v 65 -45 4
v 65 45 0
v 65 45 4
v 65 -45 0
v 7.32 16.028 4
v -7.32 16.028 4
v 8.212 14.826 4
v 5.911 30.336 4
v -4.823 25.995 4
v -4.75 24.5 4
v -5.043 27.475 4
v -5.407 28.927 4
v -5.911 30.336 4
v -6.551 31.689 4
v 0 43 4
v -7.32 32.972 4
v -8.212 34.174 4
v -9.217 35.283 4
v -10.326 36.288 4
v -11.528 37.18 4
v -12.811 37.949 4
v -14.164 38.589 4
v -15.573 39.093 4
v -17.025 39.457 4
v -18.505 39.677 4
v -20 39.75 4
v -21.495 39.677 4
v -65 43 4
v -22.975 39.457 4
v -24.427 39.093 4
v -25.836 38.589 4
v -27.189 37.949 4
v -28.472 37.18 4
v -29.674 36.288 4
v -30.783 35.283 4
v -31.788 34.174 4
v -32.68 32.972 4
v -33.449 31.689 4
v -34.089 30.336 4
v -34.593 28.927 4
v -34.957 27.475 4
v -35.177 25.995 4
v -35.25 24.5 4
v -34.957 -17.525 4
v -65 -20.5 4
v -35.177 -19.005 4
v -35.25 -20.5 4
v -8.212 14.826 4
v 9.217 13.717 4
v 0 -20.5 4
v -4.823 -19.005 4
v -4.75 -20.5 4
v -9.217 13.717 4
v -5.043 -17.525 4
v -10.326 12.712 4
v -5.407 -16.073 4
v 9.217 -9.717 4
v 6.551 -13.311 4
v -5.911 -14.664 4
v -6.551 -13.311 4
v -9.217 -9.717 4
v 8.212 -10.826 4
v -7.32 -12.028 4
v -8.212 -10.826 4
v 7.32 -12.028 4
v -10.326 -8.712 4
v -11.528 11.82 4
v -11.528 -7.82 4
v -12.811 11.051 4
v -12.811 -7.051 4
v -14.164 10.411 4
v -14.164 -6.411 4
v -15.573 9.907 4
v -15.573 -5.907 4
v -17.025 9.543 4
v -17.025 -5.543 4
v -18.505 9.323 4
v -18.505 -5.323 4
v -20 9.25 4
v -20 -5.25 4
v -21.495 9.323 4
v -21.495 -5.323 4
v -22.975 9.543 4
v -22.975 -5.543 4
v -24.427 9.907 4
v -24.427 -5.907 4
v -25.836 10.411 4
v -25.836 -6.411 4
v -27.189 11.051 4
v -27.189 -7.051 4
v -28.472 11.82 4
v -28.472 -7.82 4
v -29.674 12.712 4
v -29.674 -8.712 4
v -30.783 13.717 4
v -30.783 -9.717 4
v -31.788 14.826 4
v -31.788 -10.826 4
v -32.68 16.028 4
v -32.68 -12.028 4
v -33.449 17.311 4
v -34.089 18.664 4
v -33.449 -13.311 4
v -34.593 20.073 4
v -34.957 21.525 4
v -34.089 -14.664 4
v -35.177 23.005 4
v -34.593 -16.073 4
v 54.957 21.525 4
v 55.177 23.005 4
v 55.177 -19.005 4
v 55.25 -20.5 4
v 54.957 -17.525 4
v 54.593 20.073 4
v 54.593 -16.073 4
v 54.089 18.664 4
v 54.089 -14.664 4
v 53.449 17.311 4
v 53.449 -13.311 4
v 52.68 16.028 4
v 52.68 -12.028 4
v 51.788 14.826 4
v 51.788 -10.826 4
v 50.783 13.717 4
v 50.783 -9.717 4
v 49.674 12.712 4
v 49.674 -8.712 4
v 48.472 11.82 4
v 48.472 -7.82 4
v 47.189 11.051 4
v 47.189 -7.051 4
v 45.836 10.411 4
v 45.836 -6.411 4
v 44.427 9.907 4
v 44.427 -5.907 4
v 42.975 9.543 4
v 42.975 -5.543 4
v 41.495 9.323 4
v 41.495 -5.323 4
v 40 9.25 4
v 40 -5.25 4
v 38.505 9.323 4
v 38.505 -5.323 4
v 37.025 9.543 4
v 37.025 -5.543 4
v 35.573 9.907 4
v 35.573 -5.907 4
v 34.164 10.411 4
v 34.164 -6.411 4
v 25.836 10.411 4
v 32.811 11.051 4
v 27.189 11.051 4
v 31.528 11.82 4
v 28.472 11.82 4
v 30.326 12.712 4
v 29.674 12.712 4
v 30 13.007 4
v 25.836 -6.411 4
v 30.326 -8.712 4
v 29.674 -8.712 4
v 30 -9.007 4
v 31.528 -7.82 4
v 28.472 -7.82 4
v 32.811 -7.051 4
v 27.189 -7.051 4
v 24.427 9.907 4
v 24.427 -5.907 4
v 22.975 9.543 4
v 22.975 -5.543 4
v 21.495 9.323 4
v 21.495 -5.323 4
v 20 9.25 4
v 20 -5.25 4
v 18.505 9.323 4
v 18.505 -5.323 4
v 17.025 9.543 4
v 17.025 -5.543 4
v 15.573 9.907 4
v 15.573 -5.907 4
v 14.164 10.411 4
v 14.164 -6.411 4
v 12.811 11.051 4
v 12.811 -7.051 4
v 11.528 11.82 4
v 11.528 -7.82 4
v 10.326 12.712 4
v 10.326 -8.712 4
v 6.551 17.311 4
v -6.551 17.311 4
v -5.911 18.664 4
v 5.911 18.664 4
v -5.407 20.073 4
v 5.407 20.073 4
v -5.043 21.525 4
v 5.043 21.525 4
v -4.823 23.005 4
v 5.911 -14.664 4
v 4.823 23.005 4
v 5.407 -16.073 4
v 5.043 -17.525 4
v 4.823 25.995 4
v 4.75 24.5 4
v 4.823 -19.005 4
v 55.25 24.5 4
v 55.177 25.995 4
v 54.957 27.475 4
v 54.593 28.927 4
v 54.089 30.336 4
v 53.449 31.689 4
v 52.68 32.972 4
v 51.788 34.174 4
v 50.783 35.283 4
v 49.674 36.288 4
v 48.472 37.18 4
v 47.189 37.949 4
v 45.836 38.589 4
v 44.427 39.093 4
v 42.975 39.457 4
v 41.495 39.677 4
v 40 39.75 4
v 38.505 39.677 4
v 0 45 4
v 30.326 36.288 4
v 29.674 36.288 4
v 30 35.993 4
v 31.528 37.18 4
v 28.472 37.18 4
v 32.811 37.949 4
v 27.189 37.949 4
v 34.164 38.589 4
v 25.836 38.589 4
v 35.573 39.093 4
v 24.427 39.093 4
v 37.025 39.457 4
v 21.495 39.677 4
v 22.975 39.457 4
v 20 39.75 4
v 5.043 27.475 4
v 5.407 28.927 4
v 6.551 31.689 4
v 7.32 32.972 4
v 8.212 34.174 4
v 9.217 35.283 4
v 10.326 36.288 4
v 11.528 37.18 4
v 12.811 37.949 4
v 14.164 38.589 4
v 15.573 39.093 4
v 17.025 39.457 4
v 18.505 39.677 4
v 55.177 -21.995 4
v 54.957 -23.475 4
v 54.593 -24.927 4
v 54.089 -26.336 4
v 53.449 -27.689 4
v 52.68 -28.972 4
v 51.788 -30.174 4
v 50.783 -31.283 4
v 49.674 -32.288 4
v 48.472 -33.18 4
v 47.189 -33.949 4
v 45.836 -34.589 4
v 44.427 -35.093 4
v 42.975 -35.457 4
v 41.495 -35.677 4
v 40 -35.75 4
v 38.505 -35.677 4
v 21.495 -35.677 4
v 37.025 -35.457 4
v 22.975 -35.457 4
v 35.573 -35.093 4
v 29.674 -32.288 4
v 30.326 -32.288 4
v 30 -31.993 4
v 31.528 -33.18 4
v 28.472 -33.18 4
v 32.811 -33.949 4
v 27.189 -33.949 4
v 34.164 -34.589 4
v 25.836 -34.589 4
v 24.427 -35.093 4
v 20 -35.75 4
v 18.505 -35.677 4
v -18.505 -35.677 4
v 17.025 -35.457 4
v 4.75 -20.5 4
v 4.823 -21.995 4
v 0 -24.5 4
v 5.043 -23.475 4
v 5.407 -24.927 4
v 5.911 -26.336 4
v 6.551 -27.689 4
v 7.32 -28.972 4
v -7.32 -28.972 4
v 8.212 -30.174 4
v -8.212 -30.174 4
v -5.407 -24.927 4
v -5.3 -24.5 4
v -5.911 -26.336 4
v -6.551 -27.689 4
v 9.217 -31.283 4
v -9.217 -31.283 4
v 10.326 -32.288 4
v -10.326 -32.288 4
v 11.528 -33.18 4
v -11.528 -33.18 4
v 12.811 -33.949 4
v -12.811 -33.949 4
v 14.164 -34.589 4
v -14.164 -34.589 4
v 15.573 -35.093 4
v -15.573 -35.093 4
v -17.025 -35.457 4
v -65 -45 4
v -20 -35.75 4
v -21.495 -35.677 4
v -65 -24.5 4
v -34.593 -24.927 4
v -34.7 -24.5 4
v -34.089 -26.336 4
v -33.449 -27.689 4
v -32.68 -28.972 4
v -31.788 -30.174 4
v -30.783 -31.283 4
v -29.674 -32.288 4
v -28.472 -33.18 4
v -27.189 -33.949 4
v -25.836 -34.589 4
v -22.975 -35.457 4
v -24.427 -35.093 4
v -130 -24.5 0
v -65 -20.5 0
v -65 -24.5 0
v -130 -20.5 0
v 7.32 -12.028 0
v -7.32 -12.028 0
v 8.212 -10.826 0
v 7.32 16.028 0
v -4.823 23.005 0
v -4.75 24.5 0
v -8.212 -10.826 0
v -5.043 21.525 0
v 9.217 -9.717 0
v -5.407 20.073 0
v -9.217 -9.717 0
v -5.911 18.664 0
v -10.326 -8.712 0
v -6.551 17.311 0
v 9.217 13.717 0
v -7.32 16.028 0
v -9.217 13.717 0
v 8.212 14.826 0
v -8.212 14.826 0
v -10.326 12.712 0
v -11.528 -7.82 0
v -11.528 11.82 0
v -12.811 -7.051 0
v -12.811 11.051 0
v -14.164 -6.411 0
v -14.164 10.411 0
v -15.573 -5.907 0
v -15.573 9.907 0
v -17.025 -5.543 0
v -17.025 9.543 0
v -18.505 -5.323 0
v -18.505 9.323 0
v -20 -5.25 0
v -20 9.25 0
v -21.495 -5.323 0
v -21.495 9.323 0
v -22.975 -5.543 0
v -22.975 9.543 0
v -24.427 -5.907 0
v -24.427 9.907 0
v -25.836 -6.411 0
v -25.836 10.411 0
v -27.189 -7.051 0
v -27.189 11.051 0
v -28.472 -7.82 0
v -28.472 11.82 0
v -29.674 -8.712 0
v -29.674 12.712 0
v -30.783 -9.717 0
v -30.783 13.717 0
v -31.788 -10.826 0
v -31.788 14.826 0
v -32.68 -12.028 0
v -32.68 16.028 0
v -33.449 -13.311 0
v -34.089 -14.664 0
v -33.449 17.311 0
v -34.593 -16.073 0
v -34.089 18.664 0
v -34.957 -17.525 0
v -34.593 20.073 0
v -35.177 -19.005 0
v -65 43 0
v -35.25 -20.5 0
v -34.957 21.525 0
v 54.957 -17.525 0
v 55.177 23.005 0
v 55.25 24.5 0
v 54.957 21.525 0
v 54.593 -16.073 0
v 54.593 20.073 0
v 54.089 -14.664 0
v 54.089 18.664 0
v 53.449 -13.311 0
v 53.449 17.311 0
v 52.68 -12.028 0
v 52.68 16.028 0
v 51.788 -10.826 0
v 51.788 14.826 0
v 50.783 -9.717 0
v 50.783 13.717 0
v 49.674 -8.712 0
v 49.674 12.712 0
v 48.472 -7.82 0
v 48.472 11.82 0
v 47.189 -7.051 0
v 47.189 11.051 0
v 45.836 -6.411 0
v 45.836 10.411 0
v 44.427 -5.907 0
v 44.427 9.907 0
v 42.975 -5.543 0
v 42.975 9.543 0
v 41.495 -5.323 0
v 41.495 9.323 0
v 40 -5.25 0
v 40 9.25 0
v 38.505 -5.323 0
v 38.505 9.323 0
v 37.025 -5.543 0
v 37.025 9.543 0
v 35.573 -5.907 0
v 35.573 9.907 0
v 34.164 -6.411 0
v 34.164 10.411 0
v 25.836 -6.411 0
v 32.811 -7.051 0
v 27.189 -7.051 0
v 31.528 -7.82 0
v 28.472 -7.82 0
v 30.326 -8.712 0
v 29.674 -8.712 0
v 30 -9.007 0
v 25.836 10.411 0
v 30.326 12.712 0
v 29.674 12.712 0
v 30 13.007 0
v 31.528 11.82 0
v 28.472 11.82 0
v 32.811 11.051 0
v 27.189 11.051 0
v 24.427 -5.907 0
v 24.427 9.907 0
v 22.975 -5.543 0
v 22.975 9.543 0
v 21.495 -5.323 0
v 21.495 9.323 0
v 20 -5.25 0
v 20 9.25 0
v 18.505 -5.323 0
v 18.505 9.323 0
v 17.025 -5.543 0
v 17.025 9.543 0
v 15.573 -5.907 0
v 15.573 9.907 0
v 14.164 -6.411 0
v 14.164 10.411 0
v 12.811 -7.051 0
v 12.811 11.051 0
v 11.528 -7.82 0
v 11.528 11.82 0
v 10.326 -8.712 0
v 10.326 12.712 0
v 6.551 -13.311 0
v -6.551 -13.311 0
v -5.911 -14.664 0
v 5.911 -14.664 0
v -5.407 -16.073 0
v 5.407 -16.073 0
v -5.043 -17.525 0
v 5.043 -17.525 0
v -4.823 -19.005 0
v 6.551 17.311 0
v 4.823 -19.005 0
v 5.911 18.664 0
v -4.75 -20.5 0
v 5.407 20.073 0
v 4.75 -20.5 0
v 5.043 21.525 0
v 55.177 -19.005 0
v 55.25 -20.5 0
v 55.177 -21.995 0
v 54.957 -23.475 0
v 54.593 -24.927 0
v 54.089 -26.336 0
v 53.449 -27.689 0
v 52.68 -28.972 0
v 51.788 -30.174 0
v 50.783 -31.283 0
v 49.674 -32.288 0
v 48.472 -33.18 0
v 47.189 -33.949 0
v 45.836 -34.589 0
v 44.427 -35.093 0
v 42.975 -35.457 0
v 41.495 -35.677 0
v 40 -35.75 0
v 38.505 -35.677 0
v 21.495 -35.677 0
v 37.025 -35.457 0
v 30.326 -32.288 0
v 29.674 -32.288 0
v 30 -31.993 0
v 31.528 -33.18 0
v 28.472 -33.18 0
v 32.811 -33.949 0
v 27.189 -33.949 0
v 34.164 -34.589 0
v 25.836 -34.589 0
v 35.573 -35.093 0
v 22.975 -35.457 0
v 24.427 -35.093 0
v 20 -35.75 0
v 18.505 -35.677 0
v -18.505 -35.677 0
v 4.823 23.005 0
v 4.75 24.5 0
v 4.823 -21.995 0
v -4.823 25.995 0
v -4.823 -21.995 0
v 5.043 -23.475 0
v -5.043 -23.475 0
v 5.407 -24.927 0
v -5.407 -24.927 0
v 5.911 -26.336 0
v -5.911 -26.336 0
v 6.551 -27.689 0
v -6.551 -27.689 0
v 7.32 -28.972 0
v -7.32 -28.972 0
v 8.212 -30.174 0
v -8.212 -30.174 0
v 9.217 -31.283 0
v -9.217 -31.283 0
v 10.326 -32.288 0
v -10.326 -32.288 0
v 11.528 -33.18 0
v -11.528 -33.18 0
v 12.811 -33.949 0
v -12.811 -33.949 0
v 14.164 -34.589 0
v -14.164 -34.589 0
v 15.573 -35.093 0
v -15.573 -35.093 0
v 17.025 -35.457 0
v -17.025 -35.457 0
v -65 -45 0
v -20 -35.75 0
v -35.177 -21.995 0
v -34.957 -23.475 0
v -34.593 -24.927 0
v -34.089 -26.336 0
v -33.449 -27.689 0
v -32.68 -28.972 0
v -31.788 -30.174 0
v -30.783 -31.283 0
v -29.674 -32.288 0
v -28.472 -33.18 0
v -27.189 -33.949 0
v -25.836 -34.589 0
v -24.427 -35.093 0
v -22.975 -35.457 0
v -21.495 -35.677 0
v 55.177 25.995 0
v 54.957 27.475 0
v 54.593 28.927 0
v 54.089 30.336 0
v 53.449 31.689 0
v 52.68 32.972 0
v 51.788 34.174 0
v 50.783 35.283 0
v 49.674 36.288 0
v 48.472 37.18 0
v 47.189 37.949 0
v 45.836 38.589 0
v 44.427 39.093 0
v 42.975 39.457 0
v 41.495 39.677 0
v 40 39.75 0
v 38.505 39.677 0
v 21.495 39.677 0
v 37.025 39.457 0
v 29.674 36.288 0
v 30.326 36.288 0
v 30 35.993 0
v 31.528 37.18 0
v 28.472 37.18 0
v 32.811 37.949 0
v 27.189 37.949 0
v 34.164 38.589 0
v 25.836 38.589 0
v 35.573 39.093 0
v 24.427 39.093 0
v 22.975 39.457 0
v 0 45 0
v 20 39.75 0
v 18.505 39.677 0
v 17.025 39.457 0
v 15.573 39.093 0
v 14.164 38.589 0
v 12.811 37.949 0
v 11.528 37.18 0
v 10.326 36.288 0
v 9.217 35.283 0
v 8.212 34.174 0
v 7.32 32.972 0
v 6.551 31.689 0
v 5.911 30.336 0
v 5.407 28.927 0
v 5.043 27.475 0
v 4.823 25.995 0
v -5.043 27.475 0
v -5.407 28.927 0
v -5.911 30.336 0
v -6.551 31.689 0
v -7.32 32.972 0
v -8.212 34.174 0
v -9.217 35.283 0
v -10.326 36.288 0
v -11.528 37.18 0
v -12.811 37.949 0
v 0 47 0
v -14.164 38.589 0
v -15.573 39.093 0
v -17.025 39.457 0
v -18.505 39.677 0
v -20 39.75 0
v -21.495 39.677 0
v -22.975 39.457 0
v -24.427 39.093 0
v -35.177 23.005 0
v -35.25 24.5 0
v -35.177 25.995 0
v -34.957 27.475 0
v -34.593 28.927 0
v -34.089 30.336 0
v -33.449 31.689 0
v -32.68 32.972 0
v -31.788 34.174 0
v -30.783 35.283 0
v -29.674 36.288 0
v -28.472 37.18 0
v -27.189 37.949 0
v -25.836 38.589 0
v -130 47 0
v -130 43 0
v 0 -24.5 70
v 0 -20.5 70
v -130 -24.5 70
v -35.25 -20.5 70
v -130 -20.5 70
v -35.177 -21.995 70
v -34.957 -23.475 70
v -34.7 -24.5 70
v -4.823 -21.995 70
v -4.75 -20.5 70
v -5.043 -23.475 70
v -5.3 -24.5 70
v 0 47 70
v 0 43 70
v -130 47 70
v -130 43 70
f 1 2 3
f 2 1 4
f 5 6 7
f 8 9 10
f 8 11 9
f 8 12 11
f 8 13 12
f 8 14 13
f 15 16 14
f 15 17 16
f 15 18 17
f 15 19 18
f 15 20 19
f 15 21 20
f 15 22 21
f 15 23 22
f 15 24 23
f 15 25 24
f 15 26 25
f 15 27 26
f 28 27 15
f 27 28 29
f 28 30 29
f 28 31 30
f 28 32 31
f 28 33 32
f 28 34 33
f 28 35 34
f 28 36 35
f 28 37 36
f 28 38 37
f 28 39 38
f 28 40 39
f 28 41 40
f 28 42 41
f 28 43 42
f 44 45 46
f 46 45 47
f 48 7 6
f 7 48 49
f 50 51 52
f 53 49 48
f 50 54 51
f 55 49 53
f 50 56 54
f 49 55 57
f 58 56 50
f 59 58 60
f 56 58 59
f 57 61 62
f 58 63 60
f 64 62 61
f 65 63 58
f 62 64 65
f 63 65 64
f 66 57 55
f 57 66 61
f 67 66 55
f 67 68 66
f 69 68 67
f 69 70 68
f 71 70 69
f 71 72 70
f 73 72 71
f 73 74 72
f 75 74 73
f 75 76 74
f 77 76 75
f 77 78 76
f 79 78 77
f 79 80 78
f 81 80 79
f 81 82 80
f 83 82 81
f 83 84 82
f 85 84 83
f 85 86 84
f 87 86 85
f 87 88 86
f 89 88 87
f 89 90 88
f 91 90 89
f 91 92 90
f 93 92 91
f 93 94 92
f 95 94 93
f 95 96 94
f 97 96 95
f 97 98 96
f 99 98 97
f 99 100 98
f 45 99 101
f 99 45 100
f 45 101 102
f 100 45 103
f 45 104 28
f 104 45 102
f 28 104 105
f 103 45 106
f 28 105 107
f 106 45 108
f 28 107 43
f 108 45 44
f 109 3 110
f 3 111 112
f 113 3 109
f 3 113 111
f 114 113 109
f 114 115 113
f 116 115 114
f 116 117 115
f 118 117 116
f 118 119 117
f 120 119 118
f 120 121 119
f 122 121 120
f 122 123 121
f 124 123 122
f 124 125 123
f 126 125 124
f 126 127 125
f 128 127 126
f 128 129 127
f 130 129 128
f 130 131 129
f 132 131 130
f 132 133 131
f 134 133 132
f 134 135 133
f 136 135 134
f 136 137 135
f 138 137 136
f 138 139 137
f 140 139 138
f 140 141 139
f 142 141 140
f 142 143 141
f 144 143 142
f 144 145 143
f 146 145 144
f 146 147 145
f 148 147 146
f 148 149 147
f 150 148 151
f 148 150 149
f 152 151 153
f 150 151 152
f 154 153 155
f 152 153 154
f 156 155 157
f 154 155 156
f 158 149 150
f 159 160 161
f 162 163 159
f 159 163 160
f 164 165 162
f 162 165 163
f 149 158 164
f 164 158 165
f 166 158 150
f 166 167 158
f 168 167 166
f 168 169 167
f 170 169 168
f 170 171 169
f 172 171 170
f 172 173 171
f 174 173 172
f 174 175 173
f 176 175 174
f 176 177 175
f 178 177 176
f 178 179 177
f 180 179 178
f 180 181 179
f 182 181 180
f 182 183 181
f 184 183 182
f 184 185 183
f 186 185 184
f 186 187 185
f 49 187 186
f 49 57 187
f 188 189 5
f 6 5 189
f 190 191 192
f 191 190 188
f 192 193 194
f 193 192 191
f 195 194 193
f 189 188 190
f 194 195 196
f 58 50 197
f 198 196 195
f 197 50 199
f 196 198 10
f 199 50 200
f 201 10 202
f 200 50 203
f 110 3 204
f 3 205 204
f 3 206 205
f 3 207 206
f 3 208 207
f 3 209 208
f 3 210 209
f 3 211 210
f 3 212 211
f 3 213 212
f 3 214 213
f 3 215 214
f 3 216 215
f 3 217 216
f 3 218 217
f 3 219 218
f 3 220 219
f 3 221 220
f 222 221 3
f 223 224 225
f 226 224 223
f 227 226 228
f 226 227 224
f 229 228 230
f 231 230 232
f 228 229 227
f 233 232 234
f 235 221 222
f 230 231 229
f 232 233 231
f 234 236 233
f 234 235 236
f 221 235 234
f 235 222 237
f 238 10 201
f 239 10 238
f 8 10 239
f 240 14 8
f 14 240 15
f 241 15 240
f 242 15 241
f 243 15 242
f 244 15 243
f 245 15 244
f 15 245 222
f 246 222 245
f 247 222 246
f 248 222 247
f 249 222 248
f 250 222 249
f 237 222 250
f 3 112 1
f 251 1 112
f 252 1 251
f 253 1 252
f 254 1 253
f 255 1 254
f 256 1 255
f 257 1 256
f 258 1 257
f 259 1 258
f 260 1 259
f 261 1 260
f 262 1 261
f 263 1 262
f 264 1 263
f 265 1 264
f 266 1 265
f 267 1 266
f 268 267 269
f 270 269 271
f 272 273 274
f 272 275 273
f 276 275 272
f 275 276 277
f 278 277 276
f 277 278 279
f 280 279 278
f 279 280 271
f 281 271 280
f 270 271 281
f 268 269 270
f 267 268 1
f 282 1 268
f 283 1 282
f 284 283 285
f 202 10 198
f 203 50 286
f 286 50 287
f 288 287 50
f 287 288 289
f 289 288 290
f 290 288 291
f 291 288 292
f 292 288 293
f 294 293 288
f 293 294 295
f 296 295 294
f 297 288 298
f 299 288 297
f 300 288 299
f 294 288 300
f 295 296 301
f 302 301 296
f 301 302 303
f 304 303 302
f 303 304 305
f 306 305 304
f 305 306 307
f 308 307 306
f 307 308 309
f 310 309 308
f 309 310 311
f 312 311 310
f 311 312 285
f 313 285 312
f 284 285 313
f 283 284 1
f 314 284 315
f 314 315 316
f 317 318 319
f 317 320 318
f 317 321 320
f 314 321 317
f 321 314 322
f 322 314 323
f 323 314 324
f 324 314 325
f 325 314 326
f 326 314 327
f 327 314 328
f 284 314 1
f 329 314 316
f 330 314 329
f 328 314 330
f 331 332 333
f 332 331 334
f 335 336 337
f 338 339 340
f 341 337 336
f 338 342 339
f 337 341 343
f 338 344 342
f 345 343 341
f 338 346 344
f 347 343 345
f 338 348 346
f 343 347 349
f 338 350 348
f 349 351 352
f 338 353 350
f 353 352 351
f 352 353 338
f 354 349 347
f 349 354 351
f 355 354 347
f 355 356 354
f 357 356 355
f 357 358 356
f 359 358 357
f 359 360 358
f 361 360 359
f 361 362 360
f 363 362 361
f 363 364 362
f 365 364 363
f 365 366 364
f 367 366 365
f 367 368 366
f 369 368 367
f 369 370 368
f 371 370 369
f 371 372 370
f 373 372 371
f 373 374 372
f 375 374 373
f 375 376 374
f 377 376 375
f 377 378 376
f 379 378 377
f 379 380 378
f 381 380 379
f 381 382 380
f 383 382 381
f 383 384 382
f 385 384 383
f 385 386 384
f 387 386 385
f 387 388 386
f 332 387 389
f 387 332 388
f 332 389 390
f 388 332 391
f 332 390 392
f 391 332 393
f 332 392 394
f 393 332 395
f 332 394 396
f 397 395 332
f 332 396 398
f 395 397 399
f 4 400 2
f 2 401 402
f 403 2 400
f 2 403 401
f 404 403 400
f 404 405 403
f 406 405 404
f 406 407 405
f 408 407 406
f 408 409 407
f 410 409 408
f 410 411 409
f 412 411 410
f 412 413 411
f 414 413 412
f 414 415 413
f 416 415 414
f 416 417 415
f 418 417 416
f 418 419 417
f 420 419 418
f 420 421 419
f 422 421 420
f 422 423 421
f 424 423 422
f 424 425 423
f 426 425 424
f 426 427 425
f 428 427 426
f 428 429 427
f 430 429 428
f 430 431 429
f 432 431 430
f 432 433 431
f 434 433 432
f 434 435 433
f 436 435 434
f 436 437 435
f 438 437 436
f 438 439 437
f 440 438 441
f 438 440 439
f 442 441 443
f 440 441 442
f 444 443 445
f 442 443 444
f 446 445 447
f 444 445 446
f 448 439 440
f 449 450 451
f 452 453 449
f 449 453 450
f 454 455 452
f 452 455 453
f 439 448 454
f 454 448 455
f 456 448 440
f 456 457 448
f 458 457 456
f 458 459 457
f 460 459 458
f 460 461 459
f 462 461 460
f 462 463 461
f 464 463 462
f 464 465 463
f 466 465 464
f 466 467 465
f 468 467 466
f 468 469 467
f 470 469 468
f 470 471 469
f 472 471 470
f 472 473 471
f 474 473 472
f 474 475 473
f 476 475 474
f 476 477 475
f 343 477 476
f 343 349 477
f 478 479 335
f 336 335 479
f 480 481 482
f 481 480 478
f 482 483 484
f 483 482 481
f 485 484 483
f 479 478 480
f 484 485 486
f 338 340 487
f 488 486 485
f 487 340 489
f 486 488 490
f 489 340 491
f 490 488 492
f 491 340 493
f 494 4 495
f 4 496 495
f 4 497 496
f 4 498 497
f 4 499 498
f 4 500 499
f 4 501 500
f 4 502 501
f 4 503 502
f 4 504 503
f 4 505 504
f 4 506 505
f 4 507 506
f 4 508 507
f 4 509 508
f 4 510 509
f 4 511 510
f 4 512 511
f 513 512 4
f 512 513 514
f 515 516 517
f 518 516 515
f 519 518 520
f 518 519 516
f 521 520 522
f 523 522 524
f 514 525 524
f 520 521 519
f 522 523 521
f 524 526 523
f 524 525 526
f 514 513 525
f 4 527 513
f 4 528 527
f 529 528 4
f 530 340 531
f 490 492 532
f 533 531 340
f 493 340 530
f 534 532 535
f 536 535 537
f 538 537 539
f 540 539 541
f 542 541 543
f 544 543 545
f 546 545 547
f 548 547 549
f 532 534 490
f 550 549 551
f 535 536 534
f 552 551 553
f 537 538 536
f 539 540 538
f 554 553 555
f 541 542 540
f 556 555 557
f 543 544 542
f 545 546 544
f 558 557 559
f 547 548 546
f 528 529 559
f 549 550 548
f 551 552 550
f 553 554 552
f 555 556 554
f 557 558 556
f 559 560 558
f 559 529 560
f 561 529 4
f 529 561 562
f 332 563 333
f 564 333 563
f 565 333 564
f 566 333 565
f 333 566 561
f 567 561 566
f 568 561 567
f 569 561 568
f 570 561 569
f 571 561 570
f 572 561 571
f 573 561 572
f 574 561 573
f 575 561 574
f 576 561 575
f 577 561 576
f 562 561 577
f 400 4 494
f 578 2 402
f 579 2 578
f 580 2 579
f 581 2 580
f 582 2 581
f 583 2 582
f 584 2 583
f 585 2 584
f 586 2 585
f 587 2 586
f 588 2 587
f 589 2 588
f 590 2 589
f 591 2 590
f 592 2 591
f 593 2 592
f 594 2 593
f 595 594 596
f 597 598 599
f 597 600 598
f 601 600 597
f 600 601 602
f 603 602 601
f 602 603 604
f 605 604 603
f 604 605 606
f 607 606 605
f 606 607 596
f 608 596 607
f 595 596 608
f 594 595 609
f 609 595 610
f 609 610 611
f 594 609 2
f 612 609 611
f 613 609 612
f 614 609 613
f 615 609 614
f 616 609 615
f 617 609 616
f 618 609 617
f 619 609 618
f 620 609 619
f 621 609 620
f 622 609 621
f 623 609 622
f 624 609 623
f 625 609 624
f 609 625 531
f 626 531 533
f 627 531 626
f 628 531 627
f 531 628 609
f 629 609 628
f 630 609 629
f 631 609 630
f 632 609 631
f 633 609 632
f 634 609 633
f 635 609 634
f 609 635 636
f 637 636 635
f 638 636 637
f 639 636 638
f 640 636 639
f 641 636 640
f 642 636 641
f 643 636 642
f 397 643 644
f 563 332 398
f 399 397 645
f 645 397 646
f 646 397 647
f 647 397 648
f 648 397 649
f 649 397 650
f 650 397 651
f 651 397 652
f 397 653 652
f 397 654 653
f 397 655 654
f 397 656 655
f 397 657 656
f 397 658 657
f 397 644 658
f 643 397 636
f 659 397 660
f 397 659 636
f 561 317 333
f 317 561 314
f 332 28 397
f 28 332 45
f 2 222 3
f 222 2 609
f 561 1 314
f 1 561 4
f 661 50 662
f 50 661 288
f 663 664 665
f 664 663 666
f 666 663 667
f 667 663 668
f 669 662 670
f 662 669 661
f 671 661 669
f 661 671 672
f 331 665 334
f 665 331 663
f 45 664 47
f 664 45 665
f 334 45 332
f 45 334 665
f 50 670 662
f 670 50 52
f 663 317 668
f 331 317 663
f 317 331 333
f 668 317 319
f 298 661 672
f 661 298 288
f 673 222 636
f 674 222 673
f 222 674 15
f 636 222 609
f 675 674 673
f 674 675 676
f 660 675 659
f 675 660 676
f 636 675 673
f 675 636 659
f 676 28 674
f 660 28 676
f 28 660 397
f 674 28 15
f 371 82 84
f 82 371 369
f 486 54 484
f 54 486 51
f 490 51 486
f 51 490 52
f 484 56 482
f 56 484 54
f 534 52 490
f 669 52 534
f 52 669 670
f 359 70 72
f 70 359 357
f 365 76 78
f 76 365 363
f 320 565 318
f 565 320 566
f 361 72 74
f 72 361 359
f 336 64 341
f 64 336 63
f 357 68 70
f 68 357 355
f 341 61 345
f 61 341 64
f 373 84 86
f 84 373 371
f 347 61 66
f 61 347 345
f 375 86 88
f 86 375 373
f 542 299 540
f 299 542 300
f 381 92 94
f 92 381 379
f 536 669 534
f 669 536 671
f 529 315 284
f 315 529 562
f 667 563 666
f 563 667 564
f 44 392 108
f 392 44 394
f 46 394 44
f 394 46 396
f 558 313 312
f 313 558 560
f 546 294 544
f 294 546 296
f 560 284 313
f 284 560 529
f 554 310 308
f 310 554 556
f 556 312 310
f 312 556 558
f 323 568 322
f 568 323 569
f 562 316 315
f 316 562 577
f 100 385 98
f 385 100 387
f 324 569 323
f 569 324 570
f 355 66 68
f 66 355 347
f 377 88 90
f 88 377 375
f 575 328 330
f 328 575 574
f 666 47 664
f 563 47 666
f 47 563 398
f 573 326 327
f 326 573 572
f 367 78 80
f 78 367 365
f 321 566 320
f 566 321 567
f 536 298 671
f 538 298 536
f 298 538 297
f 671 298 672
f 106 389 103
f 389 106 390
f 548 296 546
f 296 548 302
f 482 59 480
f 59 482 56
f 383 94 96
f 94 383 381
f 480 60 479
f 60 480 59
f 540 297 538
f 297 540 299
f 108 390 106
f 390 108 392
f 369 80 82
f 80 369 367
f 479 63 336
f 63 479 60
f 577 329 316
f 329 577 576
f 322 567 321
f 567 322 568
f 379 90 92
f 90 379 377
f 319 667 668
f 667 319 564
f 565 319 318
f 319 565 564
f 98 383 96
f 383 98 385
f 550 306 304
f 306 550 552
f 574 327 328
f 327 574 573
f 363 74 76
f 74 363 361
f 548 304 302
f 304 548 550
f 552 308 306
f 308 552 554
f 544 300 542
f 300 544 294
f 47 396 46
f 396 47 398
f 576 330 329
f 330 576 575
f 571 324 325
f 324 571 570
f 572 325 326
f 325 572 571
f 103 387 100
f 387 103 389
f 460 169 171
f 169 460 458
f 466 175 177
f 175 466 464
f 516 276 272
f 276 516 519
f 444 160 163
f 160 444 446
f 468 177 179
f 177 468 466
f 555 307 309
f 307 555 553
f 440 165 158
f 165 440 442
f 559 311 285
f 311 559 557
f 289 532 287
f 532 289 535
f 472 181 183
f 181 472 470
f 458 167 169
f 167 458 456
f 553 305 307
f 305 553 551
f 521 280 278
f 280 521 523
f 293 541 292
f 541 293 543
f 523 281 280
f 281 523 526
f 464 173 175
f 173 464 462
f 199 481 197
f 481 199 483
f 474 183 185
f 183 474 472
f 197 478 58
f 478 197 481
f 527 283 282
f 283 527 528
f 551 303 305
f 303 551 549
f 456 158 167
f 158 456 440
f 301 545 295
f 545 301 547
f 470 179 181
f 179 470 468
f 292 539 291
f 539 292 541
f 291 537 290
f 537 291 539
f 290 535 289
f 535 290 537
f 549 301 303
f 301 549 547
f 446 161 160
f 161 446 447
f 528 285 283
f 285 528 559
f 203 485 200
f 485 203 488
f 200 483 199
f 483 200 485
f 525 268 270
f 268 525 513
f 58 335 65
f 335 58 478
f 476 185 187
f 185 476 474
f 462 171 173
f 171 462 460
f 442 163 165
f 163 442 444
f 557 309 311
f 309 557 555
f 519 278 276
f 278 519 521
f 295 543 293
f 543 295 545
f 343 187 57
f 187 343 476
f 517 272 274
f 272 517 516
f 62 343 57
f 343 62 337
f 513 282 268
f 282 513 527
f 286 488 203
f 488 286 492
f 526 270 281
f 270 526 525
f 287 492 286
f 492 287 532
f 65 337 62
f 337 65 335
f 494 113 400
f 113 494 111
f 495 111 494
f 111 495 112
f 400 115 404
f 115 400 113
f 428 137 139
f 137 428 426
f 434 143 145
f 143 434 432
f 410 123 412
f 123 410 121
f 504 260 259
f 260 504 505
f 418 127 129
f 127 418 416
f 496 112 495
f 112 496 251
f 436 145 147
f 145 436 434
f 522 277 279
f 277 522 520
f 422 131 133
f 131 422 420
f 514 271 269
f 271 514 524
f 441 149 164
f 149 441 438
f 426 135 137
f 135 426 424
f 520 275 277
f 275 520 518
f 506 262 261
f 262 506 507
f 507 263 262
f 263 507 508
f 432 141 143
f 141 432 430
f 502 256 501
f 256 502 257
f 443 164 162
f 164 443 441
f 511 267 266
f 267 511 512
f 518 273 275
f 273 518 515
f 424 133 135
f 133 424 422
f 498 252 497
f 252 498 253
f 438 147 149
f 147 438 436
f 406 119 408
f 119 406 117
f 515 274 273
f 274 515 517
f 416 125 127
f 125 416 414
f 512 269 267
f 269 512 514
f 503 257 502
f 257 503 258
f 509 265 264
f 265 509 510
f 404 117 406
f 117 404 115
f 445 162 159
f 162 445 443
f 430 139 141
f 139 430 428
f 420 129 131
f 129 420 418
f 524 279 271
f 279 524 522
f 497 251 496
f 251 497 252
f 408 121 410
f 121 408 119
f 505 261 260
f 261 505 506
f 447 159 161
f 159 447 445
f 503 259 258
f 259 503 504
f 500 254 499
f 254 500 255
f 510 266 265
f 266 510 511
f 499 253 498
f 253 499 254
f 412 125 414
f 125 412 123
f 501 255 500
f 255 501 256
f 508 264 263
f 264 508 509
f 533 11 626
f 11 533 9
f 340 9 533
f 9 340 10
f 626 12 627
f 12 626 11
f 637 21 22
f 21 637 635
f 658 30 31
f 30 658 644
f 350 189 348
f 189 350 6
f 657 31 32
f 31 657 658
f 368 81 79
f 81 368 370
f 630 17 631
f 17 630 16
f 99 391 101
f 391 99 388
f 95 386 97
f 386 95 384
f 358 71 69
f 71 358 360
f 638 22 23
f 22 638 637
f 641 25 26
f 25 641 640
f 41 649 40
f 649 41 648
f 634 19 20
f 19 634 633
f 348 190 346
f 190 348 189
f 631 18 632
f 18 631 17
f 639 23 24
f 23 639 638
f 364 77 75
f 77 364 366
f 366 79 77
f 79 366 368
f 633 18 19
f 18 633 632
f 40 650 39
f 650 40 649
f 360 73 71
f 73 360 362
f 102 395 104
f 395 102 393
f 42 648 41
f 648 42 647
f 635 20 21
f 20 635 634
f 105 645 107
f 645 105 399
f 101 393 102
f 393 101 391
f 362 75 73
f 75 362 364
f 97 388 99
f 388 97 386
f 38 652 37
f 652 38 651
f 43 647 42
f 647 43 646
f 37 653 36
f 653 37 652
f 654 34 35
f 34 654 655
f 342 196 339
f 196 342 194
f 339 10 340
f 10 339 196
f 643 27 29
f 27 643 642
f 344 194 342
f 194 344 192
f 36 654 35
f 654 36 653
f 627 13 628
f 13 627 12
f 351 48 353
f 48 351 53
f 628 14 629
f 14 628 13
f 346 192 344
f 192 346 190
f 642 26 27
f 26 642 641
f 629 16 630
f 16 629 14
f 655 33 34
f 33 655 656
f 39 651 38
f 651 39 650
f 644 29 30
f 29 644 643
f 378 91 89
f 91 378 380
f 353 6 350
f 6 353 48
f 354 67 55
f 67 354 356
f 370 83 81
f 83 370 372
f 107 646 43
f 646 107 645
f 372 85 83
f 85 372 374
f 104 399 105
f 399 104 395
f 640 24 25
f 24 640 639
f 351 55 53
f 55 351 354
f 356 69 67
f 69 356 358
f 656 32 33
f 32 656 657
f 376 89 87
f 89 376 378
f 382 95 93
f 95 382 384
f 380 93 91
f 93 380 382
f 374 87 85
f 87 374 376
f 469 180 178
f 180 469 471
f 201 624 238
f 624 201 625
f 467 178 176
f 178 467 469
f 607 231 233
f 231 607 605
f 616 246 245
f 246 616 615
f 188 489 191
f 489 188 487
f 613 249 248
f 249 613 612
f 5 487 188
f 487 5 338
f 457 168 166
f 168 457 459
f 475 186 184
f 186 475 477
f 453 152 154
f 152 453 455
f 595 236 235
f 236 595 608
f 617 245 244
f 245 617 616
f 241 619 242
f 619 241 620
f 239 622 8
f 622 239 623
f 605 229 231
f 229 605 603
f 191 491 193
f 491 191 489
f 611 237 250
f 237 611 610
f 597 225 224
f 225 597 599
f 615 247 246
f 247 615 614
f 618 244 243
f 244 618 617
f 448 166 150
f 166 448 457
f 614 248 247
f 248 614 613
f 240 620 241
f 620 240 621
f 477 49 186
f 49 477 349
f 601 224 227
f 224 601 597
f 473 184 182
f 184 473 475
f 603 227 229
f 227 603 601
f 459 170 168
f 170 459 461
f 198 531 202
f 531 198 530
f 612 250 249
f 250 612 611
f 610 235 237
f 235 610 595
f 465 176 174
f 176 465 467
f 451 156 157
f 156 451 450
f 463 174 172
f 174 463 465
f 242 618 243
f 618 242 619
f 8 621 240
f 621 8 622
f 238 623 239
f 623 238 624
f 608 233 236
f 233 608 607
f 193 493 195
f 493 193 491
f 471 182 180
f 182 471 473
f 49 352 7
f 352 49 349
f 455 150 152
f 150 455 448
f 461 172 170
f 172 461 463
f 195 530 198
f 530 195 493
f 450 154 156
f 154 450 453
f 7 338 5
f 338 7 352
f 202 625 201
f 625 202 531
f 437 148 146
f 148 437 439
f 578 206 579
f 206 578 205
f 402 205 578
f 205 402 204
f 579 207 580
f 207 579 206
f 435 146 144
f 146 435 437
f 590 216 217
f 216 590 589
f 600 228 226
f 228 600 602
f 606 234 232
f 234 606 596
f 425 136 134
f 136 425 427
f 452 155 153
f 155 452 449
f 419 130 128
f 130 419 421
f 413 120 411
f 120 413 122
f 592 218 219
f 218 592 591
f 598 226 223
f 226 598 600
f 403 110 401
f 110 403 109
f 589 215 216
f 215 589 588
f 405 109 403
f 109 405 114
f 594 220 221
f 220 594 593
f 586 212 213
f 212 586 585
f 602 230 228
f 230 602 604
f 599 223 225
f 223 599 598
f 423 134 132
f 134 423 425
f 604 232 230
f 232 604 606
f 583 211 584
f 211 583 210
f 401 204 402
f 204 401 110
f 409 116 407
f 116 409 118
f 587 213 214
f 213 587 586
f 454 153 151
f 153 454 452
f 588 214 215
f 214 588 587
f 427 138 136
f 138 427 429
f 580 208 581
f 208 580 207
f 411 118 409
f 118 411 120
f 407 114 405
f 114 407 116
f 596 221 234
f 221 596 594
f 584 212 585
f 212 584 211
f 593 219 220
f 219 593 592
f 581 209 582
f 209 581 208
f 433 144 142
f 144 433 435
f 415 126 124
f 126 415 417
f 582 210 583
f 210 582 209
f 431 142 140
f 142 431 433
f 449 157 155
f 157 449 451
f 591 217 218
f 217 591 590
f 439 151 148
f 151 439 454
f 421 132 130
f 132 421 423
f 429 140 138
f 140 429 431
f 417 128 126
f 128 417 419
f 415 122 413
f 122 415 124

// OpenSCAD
// Built by bench/smallmodels/features/compiler.py from a list of features.
$fn = 64;
difference() {
  union() {
    translate([0, 0, 0]) translate([-65, -45, 0]) cube([130, 90, 4]);
    translate([-65, -22.5, 0]) translate([-65, -2, 0]) cube([130, 4, 70]);
    translate([-65, 45, 0]) translate([-65, -2, 0]) cube([130, 4, 70]);
  }
  union() {
    translate([-20, -20.5, -1]) rotate([0, 0, 0]) cylinder(d = 30.5, h = 72);
    translate([20, -20.5, -1]) rotate([0, 0, 0]) cylinder(d = 30.5, h = 72);
    translate([40, -20.5, -1]) rotate([0, 0, 0]) cylinder(d = 30.5, h = 72);
    translate([-20, 24.5, -1]) rotate([0, 0, 0]) cylinder(d = 30.5, h = 72);
    translate([20, 24.5, -1]) rotate([0, 0, 0]) cylinder(d = 30.5, h = 72);
    translate([40, 24.5, -1]) rotate([0, 0, 0]) cylinder(d = 30.5, h = 72);
  }
}
